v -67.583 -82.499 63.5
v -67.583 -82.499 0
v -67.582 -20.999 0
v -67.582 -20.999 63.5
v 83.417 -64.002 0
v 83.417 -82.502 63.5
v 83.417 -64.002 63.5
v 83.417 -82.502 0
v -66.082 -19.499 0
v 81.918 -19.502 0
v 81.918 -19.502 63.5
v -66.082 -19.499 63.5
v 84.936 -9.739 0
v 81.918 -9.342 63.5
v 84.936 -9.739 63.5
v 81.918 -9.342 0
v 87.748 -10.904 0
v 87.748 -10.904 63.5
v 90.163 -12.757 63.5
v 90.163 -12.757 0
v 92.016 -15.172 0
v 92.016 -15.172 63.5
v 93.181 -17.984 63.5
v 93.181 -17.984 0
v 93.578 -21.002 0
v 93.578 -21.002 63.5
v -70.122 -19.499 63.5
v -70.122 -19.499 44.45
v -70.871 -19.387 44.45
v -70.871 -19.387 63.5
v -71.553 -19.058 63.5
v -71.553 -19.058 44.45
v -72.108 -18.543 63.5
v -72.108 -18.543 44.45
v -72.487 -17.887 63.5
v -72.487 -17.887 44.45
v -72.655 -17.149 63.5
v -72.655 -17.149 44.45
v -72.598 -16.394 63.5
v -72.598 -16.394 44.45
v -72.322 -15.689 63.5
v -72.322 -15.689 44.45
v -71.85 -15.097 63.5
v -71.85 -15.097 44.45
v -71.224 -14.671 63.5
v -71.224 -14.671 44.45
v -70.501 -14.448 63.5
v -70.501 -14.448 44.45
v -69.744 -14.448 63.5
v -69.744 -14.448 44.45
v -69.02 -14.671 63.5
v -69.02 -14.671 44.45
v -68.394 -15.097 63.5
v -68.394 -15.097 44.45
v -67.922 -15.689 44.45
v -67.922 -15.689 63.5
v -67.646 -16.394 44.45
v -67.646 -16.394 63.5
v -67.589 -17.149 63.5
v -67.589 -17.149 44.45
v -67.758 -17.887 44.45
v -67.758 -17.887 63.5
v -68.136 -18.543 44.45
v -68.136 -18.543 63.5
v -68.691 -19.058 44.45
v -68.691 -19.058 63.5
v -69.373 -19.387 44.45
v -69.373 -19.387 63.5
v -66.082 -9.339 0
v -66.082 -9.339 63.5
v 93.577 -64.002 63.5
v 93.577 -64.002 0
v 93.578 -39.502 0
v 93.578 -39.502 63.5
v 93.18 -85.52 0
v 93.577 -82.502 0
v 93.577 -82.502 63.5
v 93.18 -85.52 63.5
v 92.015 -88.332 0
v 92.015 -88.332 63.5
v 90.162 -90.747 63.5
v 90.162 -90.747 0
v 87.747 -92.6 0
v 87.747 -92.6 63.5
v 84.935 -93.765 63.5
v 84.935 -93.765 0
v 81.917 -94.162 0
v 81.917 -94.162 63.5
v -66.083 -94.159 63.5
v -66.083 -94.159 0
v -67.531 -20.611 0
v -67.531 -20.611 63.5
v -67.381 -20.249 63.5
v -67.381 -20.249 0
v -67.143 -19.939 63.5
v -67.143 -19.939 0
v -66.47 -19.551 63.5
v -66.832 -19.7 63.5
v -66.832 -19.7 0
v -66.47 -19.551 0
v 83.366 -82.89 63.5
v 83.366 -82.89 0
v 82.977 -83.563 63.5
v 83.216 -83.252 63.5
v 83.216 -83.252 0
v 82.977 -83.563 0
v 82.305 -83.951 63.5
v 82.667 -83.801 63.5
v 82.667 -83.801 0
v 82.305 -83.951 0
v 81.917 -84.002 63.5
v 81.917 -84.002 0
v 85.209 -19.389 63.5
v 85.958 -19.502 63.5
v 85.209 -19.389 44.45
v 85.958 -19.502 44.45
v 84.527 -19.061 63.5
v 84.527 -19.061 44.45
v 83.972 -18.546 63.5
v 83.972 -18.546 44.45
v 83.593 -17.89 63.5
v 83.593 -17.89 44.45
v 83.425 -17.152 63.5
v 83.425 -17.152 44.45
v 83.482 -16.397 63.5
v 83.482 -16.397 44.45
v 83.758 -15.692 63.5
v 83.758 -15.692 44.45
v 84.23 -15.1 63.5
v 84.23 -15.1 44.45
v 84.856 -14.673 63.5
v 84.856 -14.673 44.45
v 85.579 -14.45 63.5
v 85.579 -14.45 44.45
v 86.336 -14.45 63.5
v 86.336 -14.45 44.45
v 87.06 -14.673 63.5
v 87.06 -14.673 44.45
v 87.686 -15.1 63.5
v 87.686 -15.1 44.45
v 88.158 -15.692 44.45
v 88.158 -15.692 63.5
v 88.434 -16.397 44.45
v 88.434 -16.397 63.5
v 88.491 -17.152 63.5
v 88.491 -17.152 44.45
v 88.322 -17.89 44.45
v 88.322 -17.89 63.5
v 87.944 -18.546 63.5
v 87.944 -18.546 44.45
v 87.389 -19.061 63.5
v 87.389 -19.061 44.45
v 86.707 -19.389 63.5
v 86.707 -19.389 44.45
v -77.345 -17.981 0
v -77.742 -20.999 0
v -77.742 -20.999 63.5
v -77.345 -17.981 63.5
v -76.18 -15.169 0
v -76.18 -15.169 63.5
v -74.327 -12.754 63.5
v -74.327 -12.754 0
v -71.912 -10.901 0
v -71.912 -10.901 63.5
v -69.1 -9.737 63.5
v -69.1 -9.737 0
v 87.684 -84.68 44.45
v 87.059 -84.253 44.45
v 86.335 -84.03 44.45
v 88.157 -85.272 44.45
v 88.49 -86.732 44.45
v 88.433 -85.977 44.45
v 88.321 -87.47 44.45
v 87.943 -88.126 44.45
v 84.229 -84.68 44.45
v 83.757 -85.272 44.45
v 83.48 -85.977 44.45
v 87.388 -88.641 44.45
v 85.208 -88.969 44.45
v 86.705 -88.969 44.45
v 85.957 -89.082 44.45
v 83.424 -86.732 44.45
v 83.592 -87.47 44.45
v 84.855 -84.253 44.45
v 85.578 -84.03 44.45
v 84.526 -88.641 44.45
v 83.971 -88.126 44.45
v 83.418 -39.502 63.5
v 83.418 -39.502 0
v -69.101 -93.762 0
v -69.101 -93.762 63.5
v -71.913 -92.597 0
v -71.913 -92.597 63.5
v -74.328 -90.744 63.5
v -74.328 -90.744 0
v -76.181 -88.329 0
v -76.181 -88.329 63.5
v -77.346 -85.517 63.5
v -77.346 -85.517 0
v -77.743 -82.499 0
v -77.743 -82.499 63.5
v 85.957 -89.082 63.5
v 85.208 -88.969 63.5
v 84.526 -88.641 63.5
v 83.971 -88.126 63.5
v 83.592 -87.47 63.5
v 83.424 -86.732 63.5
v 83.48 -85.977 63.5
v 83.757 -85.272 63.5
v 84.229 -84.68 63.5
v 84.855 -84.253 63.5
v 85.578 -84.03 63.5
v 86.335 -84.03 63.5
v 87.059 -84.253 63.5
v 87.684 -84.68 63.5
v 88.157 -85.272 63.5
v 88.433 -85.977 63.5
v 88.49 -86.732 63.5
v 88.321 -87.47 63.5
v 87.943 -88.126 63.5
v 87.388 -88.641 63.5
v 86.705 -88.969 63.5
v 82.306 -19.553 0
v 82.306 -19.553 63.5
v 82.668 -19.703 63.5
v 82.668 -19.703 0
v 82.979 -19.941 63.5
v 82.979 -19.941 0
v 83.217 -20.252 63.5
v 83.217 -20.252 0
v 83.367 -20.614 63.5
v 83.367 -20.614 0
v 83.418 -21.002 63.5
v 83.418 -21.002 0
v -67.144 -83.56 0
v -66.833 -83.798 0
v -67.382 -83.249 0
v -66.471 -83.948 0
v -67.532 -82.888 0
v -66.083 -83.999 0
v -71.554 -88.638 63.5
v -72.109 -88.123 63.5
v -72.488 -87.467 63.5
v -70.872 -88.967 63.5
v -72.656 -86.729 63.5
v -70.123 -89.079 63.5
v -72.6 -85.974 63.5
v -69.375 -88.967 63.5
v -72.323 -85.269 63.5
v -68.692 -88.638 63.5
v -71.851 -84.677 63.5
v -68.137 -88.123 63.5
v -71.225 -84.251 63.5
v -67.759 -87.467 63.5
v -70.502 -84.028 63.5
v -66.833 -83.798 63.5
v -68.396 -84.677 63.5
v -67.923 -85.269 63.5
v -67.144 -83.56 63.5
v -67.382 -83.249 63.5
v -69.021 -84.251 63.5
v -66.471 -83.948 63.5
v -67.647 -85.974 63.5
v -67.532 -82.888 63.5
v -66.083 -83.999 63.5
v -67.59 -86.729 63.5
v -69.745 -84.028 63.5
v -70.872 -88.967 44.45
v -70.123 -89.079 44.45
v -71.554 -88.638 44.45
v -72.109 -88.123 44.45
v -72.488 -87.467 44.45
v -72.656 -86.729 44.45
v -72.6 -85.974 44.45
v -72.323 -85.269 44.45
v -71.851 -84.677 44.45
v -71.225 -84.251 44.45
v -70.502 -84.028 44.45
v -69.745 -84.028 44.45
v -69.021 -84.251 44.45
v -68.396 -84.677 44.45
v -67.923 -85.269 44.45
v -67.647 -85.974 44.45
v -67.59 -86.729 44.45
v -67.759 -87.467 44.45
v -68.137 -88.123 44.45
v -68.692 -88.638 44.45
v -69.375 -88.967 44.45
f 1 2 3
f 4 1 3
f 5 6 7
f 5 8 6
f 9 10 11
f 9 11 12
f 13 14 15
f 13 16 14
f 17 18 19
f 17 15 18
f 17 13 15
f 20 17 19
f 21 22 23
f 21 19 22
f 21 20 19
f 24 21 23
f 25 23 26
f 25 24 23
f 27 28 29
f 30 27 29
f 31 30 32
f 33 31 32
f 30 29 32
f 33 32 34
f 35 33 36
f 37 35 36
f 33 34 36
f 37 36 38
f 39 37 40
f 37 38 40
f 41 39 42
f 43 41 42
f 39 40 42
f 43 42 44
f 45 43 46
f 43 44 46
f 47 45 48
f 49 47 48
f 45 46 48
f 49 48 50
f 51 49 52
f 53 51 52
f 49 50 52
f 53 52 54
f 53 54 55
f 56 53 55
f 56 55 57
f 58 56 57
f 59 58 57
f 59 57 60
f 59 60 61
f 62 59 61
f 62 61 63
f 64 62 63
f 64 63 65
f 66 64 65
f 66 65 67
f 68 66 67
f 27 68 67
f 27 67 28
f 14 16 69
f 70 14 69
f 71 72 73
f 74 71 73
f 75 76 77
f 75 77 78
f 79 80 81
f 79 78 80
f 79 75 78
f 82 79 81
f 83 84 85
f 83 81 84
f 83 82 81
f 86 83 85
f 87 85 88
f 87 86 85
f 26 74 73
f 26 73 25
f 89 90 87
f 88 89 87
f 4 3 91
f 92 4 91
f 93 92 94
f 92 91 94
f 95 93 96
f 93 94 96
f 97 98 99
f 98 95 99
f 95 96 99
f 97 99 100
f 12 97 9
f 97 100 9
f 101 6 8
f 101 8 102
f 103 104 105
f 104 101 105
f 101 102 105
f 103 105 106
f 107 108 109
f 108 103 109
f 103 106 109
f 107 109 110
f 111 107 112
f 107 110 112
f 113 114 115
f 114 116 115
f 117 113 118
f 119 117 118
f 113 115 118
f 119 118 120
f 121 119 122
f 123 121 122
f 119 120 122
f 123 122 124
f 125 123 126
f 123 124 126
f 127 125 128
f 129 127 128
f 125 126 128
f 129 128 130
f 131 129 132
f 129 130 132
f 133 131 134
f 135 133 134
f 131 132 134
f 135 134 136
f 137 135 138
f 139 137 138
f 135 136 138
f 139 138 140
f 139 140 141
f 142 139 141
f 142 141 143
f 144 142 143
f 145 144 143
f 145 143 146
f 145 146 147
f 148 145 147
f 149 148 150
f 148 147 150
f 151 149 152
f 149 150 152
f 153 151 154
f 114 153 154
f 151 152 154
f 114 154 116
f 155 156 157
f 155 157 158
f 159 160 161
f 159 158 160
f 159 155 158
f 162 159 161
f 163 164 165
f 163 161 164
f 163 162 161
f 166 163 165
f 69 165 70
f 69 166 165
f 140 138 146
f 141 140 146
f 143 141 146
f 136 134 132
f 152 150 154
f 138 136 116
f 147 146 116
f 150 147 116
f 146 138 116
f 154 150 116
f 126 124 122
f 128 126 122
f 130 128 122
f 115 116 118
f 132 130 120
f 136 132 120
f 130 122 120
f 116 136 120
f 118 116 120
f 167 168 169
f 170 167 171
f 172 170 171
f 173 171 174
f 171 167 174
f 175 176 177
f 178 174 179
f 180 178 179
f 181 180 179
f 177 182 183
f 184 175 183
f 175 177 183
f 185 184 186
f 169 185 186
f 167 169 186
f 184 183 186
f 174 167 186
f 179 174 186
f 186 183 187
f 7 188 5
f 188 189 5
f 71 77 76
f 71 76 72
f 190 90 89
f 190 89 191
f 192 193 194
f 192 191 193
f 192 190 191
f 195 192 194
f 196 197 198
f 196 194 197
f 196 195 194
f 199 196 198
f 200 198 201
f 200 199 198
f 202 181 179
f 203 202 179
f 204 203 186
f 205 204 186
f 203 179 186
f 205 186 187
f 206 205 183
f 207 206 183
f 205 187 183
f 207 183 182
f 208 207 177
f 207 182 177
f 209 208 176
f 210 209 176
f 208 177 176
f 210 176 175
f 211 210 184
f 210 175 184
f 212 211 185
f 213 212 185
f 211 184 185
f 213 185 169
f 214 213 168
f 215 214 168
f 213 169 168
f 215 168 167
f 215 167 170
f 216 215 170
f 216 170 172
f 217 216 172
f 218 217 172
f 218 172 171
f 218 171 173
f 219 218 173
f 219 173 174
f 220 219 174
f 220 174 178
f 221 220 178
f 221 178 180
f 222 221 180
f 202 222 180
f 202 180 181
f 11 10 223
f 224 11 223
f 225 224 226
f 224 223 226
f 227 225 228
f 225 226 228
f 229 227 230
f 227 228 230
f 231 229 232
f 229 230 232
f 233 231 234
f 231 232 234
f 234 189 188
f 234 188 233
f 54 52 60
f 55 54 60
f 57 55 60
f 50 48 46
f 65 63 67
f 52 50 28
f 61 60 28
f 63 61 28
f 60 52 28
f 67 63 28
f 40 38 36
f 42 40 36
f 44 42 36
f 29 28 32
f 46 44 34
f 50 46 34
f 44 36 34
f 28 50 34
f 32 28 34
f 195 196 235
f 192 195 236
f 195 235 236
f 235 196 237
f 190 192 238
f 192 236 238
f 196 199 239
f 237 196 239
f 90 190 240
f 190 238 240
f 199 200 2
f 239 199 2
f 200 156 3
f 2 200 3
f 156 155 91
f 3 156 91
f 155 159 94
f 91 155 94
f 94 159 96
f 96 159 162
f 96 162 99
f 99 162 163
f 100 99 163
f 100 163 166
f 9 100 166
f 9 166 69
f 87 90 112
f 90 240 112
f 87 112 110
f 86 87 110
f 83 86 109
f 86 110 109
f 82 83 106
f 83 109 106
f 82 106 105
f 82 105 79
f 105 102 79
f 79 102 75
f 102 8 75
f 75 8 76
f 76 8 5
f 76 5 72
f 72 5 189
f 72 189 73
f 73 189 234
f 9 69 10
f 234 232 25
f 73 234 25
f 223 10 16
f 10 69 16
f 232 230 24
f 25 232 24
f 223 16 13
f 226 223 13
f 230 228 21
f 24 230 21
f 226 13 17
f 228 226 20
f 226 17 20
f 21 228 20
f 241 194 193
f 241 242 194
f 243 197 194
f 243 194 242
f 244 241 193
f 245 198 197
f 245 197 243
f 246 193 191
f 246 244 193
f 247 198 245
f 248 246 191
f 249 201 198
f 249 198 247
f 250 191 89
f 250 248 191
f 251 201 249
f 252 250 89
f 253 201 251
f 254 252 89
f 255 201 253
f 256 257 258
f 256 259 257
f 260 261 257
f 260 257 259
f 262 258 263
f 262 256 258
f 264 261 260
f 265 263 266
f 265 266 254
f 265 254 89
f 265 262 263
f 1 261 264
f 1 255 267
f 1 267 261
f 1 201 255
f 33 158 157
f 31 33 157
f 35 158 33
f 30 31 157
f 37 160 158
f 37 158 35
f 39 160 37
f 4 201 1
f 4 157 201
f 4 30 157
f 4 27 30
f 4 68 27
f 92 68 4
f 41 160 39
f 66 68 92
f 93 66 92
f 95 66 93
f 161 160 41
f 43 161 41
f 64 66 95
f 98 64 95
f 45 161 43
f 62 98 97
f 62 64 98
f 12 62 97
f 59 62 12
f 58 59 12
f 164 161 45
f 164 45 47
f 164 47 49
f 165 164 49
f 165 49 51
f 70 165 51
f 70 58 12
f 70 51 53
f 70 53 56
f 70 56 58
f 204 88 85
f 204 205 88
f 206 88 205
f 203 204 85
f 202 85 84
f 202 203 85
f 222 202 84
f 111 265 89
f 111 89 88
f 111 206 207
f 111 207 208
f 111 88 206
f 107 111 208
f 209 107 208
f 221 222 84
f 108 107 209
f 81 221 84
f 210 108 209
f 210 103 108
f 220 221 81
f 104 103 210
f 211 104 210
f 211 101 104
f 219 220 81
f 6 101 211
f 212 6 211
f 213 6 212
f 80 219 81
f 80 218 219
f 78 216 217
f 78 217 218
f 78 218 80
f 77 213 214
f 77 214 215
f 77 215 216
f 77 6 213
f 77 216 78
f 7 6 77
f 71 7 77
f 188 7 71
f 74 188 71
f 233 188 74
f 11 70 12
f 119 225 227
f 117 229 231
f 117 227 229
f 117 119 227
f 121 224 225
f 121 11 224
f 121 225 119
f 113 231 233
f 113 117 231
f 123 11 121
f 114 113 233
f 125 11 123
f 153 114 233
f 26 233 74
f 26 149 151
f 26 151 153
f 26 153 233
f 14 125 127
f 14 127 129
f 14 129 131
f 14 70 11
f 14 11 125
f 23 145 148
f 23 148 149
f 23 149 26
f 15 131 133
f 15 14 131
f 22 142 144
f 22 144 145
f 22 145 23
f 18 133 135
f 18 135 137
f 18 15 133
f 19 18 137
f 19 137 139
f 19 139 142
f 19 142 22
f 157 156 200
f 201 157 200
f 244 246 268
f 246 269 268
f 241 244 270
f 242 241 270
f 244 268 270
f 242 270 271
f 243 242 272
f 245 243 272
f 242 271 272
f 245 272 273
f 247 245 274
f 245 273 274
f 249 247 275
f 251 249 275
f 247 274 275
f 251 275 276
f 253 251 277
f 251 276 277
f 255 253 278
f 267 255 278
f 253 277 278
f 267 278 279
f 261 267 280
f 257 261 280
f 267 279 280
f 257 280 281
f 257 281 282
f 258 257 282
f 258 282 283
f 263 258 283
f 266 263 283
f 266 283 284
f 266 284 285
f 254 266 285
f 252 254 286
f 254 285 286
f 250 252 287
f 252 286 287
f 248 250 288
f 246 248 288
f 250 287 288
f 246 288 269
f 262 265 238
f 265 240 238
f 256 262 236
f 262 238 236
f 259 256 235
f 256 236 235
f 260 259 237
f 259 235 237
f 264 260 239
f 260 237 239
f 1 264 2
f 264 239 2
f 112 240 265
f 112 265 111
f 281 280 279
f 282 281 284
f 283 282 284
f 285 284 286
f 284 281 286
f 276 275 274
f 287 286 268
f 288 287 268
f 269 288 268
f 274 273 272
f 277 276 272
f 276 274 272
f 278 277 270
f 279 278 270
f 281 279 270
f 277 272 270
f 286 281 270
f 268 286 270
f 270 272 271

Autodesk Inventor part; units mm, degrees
ref_plane "YZ Plane" through (0, 0, 0) normal (1, 0, 0) x (0, 1, 0)
ref_plane "XZ Plane" through (0, 0, 0) normal (0, 1, 0) x (-1, 0, 0)
ref_plane "XY Plane" through (0, 0, 0) normal (0, 0, 1) x (1, 0, 0)
sketch "Sketch1" plane through (0, 0, 0) normal (0, 0, 1) x (1, 0, 0)
  line L0 (63.4168, -84.0015) -> (-66.0832, -83.9994) projected
  line L1 (63.4168, -84.0015) -> (81.9168, -84.0018) projected
  line L2 (-67.5831, -82.4994) -> (-67.5821, -20.9994) projected
  arc A0 (-67.5831, -82.4994) -> (-66.0832, -83.9994) centre (-66.0831, -82.4994) ccw projected
  arc A1 (-66.0821, -19.4994) -> (-67.5821, -20.9994) centre (-66.0821, -20.9994) ccw projected
  line L3 (-66.0821, -19.4994) -> (63.4179, -19.5015) projected
  line L4 (64.1679, -20.2516) -> (81.9179, -20.2518) projected
  line L5 (81.9179, -19.5018) -> (63.4179, -19.5015) projected
  arc A2 (83.4179, -21.0019) -> (81.9179, -19.5018) centre (81.9179, -21.0018) ccw projected
  line L6 (83.4176, -39.5019) -> (83.4179, -21.0019) projected
  line L7 (83.4176, -39.5019) -> (83.4172, -64.0019) projected
  line L8 (83.4169, -82.5019) -> (83.4172, -64.0019) projected
  arc A3 (81.9168, -84.0018) -> (83.4169, -82.5019) centre (81.9169, -82.5018) ccw projected
  line L9 (-77.7421, -20.9992) -> (-77.7431, -82.4992)
  arc A4 (-77.7431, -82.4992) -> (-66.0833, -94.1594) centre (-66.0831, -82.4994) ccw
  line L10 (-66.0833, -94.1594) -> (63.4167, -94.1615)
  line L11 (63.4167, -94.1615) -> (81.9167, -94.1618)
  arc A5 (81.9167, -94.1618) -> (93.5769, -82.502) centre (81.9169, -82.5018) ccw
  line L12 (93.5769, -82.502) -> (93.5772, -64.002)
  line L13 (93.5772, -64.002) -> (93.5776, -39.502)
  line L14 (93.5776, -39.502) -> (93.5779, -21.002)
  arc A6 (93.5779, -21.002) -> (81.9181, -9.3418) centre (81.9179, -21.0018) ccw
  line L15 (81.9181, -9.3418) -> (63.4181, -9.3415)
  line L16 (63.4181, -9.3415) -> (-66.0819, -9.3394)
  arc A7 (-66.0819, -9.3394) -> (-77.7421, -20.9992) centre (-66.0821, -20.9994) ccw
  point P0 (0, 0)
  dimension "d0" = 10.16
extrude "Extrusion1" add sketch "Sketch1" along normal blind 63.5
sketch "Sketch2" plane through (0, 0, 63.5) normal (0, 0, 1) x (1, 0, 0)
  circle A0 centre (-70.1221, -16.9594) radius 2.54 projected
  circle A1 centre (85.9579, -16.9619) radius 2.54 projected
  circle A2 centre (85.9568, -86.5419) radius 2.54 projected
  circle A3 centre (-70.1232, -86.5394) radius 2.54 projected
  point P0 (0, 0)
hole "Hole1" at (-70.1221, -16.9594, 63.5) at (-70.1232, -86.5394, 63.5) at (85.9579, -16.9619, 63.5) at (85.9568, -86.5419, 63.5) direction (0, 0, -1) diameter 5.08 depth 19.05
properties part number "battery hold"
